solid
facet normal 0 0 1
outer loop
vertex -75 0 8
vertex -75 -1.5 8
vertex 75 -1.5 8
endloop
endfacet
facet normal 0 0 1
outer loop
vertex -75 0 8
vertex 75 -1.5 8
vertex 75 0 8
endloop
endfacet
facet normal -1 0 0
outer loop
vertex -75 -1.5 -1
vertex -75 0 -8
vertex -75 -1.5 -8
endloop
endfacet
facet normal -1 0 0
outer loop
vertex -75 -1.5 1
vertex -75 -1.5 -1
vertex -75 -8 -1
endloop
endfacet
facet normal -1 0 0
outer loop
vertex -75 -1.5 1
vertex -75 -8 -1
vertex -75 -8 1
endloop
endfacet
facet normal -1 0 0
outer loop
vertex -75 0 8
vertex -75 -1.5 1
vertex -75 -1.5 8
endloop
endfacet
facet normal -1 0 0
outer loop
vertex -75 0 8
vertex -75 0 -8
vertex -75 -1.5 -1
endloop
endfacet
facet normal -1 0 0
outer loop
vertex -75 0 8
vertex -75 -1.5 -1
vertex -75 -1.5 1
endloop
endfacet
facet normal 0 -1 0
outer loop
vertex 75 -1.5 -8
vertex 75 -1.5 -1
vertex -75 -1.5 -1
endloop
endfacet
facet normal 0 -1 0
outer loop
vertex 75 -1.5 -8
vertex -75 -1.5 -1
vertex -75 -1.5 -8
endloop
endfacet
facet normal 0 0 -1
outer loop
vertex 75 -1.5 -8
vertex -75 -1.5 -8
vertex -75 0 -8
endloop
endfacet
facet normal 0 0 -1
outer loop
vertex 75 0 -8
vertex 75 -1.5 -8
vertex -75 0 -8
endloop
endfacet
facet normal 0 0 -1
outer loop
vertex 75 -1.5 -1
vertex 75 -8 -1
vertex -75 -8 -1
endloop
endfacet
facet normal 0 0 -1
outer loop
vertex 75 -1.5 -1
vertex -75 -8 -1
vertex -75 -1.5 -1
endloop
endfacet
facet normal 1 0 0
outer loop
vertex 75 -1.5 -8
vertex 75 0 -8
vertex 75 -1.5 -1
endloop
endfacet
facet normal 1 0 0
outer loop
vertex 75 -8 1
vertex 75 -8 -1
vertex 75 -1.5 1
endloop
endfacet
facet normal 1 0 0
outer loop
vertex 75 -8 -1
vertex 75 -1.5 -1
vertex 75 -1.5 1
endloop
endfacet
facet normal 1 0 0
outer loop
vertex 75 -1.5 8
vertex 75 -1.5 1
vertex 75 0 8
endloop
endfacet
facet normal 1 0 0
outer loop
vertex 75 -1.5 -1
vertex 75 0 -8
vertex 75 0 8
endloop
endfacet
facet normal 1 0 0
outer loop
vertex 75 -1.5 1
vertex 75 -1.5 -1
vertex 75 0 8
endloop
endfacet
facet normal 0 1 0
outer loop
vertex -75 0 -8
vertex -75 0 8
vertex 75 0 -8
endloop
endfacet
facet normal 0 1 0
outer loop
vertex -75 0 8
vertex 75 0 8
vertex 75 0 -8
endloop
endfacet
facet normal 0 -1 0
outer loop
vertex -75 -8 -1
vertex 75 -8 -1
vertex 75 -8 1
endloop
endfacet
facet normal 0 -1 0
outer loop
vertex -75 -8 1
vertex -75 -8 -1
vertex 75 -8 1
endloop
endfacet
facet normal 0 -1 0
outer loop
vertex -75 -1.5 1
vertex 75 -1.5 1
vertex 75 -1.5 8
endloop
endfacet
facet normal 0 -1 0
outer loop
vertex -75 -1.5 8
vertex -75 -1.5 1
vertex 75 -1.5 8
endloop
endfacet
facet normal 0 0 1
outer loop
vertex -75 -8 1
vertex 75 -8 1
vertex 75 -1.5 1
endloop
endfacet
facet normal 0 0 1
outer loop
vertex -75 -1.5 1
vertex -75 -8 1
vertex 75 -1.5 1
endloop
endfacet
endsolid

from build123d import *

# Parameters (mm, degrees)
BOSS_EXTRUDE1_DEPTH = 75


with BuildPart() as part:
    # Sketch1 → Boss-Extrude1 (new, symmetric)
    with BuildSketch(Plane(origin=(0, 0, 0), x_dir=(0, 0, -1), z_dir=(1, 0, 0))):
        Polygon((0, 0), (0, -8), (1, -8), (1, -1.5), (8, -1.5), (8, 0), align=None)
    extrude(amount=BOSS_EXTRUDE1_DEPTH, both=True)

    # Mirror2: part across plane


with BuildPart() as part_1:
    add(part.part)
    add(part.part.mirror(Plane(origin=(75, 0, 0), x_dir=(1, 0, 0), z_dir=(0, 0, -1))))


solid = part_1.part
